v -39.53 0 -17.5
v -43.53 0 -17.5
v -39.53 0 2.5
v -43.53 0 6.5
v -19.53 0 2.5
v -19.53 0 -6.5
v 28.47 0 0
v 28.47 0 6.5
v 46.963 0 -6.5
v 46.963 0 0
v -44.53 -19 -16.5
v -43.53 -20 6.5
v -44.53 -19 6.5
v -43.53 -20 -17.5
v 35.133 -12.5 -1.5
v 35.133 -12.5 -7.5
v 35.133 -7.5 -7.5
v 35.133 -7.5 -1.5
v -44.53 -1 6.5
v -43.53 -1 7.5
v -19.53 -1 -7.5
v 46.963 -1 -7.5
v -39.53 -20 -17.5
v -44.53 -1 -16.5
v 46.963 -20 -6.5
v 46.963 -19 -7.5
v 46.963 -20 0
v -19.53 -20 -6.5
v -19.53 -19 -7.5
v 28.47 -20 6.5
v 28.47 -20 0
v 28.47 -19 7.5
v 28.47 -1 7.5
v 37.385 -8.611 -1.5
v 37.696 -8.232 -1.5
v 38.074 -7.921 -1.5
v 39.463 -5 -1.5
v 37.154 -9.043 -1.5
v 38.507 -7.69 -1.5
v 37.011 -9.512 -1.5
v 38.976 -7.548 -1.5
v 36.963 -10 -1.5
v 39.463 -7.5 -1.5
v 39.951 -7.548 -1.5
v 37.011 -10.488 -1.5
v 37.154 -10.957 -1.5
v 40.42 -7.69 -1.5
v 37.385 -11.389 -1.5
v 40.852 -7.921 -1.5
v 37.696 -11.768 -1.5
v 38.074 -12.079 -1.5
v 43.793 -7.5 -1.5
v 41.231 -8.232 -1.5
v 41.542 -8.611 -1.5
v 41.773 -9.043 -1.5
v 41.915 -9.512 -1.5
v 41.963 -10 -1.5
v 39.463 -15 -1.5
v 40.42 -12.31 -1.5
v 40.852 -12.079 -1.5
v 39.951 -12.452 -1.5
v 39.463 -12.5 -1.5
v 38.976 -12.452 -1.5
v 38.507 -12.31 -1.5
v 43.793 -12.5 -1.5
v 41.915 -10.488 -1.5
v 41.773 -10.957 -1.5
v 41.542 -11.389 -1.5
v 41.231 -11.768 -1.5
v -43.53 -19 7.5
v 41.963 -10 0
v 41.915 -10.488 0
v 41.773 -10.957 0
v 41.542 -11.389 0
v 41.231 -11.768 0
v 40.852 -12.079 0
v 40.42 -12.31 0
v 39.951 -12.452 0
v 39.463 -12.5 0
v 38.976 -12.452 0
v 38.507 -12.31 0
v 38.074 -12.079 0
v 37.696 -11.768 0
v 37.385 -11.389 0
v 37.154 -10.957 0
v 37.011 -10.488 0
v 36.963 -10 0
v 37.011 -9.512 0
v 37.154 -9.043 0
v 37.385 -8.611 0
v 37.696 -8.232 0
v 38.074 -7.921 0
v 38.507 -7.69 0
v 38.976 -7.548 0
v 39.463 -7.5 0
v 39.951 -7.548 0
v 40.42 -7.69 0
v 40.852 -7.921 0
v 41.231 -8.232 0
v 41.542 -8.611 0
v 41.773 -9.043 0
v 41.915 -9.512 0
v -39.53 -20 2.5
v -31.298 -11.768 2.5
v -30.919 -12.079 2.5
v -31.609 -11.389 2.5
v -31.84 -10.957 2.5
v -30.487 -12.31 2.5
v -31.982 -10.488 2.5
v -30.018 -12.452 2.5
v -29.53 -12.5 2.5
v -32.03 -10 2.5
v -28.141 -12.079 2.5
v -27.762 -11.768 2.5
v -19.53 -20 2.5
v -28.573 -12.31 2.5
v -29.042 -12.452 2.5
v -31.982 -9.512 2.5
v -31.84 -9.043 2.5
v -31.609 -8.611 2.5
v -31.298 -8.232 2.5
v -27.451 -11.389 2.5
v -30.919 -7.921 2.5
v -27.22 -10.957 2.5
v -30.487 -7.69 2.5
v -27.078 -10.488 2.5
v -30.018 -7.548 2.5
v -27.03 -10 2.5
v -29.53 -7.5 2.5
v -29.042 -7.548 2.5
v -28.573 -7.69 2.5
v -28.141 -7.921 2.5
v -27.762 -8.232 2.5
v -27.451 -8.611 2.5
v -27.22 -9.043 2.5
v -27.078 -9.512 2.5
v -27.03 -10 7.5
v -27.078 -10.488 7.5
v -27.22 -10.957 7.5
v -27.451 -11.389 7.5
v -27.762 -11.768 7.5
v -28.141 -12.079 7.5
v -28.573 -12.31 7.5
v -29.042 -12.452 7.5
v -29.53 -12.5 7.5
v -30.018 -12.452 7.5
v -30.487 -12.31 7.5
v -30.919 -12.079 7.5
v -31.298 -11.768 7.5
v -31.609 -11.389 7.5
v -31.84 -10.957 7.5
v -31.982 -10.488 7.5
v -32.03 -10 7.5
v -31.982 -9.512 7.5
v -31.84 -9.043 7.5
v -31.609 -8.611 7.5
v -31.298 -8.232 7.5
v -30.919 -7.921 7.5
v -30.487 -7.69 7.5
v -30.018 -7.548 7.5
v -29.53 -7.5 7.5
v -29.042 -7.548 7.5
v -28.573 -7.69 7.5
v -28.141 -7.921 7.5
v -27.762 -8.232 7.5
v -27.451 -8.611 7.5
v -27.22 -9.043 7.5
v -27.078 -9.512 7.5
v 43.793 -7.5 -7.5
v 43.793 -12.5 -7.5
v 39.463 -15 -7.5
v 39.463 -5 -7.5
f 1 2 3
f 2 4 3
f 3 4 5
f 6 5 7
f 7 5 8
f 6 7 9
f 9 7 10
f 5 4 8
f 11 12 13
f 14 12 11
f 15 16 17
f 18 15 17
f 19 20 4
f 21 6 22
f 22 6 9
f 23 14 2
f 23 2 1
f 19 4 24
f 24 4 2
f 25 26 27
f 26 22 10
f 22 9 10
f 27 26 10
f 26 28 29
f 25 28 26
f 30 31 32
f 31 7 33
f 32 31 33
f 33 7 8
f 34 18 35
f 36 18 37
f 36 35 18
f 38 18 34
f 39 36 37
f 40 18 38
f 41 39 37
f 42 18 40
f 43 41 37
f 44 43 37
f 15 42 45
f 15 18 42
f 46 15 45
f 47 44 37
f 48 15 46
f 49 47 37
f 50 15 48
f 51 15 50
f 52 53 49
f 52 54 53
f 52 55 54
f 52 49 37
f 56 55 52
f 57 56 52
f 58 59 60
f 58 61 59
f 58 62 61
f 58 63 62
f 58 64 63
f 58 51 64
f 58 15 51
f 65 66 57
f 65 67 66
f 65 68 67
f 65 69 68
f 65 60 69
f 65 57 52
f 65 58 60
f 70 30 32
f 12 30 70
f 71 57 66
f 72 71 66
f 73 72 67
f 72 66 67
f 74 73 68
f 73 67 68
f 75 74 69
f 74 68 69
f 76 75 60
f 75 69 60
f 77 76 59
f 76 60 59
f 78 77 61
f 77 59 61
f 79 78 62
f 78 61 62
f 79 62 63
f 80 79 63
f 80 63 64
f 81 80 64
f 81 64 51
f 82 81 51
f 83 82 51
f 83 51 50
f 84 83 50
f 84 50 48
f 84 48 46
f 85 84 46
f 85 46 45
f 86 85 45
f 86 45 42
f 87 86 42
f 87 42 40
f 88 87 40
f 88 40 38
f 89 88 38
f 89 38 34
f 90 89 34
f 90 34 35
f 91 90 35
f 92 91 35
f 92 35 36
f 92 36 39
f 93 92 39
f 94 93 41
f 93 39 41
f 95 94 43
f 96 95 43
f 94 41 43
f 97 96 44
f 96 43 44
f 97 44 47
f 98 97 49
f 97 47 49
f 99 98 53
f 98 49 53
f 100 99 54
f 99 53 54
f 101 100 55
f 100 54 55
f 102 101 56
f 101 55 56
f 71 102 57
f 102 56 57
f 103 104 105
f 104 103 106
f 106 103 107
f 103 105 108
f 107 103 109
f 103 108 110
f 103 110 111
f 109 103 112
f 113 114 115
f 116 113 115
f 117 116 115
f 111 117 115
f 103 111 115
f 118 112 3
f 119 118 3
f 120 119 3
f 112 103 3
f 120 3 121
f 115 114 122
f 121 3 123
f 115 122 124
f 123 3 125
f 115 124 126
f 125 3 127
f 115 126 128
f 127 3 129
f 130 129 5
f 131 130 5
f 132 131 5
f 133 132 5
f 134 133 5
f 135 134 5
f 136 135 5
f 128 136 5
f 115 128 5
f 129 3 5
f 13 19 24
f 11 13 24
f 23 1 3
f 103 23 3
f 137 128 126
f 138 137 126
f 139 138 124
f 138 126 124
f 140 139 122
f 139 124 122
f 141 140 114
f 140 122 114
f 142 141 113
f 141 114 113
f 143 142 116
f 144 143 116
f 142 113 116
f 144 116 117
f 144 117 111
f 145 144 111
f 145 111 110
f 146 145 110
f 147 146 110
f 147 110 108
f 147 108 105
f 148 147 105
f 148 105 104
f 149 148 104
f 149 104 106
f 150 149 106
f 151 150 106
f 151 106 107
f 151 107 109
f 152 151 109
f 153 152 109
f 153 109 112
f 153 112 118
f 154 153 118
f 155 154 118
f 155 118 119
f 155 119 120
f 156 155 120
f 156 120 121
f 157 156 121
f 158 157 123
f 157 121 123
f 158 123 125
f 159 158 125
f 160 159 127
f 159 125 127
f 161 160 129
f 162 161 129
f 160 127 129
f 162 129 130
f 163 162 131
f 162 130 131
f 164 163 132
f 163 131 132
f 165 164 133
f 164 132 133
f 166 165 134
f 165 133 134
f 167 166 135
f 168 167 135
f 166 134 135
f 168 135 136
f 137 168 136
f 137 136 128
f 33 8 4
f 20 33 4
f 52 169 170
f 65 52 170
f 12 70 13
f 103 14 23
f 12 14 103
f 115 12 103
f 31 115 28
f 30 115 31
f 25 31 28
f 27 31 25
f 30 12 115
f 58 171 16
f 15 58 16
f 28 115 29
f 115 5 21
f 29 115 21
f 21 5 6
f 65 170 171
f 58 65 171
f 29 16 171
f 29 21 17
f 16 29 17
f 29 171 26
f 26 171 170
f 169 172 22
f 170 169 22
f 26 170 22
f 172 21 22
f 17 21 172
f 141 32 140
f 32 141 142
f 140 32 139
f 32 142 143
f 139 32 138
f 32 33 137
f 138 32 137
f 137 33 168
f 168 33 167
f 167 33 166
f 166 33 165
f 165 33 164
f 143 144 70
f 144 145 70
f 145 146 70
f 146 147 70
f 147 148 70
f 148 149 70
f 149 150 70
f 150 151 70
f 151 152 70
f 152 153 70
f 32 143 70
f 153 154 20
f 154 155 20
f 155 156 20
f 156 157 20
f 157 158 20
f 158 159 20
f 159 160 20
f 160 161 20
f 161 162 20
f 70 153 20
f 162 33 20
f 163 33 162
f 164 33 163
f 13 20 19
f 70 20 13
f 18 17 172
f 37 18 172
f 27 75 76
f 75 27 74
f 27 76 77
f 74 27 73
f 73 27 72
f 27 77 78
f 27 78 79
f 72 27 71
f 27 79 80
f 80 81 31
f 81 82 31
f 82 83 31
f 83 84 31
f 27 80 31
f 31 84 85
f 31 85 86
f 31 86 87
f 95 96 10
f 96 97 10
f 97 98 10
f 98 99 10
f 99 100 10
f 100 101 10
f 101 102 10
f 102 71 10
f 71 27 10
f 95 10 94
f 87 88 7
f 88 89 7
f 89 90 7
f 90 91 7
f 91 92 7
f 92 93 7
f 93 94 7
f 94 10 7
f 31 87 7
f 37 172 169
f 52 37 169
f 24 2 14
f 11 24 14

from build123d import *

# Parameters (mm, degrees)
F1_DEPTH = 20
F2_SIZE  = 1
F3_R     = 2.5
F4_DEPTH = 25
F6_DEPTH = 6


with BuildPart() as f1:
    # F0 (on Front) → F1 (new body)
    with BuildSketch(Plane.XZ):
        Polygon((-44.529999, 7.5), (-44.529999, -17.5), (-39.529999, -17.5), (-39.529999, 2.5), (-19.529999, 2.5), (-19.529999, -7.5), (0, -7.5), (46.96333, -7.5), (46.96333, 0), (28.470001, 0), (28.470001, 7.5), (0, 7.5), align=None)
    extrude(amount=F1_DEPTH)

    # F2
    f2_edges = [f1.edges().sort_by_distance(p)[0] for p in [
        (-8.029999, -20, 7.5),
        (-8.029999, 0, 7.5),
        (-44.529999, -10, 7.5),
        (-44.529999, -20, -5),
        (-44.529999, 0, -5),
        (-44.529999, -10, -17.5),
        (13.716665, 0, -7.5),
        (13.716665, -20, -7.5),
    ]]
    chamfer(f2_edges, length=F2_SIZE)

    # F3 (on face) → F4 (cut)
    with BuildSketch(Plane(origin=(0, 0, -7.5), x_dir=(1, 0, 0), z_dir=(0, 0, -1))):
        with Locations((-29.529999, 10)):
            Circle(F3_R)
        with Locations((39.46333, 10)):
            Circle(F3_R)
    extrude(amount=-F4_DEPTH, mode=Mode.SUBTRACT)

    # F5 (on face) → F6 (cut)
    with BuildSketch(Plane(origin=(0, 0, -7.5), x_dir=(1, 0, 0), z_dir=(0, 0, -1))):
        Polygon((35.133203, 12.5), (35.133203, 7.5), (39.46333, 5), (43.793457, 7.5), (43.793457, 12.5), (39.46333, 15), align=None)
    extrude(amount=-F6_DEPTH, mode=Mode.SUBTRACT)


solid = f1.part
